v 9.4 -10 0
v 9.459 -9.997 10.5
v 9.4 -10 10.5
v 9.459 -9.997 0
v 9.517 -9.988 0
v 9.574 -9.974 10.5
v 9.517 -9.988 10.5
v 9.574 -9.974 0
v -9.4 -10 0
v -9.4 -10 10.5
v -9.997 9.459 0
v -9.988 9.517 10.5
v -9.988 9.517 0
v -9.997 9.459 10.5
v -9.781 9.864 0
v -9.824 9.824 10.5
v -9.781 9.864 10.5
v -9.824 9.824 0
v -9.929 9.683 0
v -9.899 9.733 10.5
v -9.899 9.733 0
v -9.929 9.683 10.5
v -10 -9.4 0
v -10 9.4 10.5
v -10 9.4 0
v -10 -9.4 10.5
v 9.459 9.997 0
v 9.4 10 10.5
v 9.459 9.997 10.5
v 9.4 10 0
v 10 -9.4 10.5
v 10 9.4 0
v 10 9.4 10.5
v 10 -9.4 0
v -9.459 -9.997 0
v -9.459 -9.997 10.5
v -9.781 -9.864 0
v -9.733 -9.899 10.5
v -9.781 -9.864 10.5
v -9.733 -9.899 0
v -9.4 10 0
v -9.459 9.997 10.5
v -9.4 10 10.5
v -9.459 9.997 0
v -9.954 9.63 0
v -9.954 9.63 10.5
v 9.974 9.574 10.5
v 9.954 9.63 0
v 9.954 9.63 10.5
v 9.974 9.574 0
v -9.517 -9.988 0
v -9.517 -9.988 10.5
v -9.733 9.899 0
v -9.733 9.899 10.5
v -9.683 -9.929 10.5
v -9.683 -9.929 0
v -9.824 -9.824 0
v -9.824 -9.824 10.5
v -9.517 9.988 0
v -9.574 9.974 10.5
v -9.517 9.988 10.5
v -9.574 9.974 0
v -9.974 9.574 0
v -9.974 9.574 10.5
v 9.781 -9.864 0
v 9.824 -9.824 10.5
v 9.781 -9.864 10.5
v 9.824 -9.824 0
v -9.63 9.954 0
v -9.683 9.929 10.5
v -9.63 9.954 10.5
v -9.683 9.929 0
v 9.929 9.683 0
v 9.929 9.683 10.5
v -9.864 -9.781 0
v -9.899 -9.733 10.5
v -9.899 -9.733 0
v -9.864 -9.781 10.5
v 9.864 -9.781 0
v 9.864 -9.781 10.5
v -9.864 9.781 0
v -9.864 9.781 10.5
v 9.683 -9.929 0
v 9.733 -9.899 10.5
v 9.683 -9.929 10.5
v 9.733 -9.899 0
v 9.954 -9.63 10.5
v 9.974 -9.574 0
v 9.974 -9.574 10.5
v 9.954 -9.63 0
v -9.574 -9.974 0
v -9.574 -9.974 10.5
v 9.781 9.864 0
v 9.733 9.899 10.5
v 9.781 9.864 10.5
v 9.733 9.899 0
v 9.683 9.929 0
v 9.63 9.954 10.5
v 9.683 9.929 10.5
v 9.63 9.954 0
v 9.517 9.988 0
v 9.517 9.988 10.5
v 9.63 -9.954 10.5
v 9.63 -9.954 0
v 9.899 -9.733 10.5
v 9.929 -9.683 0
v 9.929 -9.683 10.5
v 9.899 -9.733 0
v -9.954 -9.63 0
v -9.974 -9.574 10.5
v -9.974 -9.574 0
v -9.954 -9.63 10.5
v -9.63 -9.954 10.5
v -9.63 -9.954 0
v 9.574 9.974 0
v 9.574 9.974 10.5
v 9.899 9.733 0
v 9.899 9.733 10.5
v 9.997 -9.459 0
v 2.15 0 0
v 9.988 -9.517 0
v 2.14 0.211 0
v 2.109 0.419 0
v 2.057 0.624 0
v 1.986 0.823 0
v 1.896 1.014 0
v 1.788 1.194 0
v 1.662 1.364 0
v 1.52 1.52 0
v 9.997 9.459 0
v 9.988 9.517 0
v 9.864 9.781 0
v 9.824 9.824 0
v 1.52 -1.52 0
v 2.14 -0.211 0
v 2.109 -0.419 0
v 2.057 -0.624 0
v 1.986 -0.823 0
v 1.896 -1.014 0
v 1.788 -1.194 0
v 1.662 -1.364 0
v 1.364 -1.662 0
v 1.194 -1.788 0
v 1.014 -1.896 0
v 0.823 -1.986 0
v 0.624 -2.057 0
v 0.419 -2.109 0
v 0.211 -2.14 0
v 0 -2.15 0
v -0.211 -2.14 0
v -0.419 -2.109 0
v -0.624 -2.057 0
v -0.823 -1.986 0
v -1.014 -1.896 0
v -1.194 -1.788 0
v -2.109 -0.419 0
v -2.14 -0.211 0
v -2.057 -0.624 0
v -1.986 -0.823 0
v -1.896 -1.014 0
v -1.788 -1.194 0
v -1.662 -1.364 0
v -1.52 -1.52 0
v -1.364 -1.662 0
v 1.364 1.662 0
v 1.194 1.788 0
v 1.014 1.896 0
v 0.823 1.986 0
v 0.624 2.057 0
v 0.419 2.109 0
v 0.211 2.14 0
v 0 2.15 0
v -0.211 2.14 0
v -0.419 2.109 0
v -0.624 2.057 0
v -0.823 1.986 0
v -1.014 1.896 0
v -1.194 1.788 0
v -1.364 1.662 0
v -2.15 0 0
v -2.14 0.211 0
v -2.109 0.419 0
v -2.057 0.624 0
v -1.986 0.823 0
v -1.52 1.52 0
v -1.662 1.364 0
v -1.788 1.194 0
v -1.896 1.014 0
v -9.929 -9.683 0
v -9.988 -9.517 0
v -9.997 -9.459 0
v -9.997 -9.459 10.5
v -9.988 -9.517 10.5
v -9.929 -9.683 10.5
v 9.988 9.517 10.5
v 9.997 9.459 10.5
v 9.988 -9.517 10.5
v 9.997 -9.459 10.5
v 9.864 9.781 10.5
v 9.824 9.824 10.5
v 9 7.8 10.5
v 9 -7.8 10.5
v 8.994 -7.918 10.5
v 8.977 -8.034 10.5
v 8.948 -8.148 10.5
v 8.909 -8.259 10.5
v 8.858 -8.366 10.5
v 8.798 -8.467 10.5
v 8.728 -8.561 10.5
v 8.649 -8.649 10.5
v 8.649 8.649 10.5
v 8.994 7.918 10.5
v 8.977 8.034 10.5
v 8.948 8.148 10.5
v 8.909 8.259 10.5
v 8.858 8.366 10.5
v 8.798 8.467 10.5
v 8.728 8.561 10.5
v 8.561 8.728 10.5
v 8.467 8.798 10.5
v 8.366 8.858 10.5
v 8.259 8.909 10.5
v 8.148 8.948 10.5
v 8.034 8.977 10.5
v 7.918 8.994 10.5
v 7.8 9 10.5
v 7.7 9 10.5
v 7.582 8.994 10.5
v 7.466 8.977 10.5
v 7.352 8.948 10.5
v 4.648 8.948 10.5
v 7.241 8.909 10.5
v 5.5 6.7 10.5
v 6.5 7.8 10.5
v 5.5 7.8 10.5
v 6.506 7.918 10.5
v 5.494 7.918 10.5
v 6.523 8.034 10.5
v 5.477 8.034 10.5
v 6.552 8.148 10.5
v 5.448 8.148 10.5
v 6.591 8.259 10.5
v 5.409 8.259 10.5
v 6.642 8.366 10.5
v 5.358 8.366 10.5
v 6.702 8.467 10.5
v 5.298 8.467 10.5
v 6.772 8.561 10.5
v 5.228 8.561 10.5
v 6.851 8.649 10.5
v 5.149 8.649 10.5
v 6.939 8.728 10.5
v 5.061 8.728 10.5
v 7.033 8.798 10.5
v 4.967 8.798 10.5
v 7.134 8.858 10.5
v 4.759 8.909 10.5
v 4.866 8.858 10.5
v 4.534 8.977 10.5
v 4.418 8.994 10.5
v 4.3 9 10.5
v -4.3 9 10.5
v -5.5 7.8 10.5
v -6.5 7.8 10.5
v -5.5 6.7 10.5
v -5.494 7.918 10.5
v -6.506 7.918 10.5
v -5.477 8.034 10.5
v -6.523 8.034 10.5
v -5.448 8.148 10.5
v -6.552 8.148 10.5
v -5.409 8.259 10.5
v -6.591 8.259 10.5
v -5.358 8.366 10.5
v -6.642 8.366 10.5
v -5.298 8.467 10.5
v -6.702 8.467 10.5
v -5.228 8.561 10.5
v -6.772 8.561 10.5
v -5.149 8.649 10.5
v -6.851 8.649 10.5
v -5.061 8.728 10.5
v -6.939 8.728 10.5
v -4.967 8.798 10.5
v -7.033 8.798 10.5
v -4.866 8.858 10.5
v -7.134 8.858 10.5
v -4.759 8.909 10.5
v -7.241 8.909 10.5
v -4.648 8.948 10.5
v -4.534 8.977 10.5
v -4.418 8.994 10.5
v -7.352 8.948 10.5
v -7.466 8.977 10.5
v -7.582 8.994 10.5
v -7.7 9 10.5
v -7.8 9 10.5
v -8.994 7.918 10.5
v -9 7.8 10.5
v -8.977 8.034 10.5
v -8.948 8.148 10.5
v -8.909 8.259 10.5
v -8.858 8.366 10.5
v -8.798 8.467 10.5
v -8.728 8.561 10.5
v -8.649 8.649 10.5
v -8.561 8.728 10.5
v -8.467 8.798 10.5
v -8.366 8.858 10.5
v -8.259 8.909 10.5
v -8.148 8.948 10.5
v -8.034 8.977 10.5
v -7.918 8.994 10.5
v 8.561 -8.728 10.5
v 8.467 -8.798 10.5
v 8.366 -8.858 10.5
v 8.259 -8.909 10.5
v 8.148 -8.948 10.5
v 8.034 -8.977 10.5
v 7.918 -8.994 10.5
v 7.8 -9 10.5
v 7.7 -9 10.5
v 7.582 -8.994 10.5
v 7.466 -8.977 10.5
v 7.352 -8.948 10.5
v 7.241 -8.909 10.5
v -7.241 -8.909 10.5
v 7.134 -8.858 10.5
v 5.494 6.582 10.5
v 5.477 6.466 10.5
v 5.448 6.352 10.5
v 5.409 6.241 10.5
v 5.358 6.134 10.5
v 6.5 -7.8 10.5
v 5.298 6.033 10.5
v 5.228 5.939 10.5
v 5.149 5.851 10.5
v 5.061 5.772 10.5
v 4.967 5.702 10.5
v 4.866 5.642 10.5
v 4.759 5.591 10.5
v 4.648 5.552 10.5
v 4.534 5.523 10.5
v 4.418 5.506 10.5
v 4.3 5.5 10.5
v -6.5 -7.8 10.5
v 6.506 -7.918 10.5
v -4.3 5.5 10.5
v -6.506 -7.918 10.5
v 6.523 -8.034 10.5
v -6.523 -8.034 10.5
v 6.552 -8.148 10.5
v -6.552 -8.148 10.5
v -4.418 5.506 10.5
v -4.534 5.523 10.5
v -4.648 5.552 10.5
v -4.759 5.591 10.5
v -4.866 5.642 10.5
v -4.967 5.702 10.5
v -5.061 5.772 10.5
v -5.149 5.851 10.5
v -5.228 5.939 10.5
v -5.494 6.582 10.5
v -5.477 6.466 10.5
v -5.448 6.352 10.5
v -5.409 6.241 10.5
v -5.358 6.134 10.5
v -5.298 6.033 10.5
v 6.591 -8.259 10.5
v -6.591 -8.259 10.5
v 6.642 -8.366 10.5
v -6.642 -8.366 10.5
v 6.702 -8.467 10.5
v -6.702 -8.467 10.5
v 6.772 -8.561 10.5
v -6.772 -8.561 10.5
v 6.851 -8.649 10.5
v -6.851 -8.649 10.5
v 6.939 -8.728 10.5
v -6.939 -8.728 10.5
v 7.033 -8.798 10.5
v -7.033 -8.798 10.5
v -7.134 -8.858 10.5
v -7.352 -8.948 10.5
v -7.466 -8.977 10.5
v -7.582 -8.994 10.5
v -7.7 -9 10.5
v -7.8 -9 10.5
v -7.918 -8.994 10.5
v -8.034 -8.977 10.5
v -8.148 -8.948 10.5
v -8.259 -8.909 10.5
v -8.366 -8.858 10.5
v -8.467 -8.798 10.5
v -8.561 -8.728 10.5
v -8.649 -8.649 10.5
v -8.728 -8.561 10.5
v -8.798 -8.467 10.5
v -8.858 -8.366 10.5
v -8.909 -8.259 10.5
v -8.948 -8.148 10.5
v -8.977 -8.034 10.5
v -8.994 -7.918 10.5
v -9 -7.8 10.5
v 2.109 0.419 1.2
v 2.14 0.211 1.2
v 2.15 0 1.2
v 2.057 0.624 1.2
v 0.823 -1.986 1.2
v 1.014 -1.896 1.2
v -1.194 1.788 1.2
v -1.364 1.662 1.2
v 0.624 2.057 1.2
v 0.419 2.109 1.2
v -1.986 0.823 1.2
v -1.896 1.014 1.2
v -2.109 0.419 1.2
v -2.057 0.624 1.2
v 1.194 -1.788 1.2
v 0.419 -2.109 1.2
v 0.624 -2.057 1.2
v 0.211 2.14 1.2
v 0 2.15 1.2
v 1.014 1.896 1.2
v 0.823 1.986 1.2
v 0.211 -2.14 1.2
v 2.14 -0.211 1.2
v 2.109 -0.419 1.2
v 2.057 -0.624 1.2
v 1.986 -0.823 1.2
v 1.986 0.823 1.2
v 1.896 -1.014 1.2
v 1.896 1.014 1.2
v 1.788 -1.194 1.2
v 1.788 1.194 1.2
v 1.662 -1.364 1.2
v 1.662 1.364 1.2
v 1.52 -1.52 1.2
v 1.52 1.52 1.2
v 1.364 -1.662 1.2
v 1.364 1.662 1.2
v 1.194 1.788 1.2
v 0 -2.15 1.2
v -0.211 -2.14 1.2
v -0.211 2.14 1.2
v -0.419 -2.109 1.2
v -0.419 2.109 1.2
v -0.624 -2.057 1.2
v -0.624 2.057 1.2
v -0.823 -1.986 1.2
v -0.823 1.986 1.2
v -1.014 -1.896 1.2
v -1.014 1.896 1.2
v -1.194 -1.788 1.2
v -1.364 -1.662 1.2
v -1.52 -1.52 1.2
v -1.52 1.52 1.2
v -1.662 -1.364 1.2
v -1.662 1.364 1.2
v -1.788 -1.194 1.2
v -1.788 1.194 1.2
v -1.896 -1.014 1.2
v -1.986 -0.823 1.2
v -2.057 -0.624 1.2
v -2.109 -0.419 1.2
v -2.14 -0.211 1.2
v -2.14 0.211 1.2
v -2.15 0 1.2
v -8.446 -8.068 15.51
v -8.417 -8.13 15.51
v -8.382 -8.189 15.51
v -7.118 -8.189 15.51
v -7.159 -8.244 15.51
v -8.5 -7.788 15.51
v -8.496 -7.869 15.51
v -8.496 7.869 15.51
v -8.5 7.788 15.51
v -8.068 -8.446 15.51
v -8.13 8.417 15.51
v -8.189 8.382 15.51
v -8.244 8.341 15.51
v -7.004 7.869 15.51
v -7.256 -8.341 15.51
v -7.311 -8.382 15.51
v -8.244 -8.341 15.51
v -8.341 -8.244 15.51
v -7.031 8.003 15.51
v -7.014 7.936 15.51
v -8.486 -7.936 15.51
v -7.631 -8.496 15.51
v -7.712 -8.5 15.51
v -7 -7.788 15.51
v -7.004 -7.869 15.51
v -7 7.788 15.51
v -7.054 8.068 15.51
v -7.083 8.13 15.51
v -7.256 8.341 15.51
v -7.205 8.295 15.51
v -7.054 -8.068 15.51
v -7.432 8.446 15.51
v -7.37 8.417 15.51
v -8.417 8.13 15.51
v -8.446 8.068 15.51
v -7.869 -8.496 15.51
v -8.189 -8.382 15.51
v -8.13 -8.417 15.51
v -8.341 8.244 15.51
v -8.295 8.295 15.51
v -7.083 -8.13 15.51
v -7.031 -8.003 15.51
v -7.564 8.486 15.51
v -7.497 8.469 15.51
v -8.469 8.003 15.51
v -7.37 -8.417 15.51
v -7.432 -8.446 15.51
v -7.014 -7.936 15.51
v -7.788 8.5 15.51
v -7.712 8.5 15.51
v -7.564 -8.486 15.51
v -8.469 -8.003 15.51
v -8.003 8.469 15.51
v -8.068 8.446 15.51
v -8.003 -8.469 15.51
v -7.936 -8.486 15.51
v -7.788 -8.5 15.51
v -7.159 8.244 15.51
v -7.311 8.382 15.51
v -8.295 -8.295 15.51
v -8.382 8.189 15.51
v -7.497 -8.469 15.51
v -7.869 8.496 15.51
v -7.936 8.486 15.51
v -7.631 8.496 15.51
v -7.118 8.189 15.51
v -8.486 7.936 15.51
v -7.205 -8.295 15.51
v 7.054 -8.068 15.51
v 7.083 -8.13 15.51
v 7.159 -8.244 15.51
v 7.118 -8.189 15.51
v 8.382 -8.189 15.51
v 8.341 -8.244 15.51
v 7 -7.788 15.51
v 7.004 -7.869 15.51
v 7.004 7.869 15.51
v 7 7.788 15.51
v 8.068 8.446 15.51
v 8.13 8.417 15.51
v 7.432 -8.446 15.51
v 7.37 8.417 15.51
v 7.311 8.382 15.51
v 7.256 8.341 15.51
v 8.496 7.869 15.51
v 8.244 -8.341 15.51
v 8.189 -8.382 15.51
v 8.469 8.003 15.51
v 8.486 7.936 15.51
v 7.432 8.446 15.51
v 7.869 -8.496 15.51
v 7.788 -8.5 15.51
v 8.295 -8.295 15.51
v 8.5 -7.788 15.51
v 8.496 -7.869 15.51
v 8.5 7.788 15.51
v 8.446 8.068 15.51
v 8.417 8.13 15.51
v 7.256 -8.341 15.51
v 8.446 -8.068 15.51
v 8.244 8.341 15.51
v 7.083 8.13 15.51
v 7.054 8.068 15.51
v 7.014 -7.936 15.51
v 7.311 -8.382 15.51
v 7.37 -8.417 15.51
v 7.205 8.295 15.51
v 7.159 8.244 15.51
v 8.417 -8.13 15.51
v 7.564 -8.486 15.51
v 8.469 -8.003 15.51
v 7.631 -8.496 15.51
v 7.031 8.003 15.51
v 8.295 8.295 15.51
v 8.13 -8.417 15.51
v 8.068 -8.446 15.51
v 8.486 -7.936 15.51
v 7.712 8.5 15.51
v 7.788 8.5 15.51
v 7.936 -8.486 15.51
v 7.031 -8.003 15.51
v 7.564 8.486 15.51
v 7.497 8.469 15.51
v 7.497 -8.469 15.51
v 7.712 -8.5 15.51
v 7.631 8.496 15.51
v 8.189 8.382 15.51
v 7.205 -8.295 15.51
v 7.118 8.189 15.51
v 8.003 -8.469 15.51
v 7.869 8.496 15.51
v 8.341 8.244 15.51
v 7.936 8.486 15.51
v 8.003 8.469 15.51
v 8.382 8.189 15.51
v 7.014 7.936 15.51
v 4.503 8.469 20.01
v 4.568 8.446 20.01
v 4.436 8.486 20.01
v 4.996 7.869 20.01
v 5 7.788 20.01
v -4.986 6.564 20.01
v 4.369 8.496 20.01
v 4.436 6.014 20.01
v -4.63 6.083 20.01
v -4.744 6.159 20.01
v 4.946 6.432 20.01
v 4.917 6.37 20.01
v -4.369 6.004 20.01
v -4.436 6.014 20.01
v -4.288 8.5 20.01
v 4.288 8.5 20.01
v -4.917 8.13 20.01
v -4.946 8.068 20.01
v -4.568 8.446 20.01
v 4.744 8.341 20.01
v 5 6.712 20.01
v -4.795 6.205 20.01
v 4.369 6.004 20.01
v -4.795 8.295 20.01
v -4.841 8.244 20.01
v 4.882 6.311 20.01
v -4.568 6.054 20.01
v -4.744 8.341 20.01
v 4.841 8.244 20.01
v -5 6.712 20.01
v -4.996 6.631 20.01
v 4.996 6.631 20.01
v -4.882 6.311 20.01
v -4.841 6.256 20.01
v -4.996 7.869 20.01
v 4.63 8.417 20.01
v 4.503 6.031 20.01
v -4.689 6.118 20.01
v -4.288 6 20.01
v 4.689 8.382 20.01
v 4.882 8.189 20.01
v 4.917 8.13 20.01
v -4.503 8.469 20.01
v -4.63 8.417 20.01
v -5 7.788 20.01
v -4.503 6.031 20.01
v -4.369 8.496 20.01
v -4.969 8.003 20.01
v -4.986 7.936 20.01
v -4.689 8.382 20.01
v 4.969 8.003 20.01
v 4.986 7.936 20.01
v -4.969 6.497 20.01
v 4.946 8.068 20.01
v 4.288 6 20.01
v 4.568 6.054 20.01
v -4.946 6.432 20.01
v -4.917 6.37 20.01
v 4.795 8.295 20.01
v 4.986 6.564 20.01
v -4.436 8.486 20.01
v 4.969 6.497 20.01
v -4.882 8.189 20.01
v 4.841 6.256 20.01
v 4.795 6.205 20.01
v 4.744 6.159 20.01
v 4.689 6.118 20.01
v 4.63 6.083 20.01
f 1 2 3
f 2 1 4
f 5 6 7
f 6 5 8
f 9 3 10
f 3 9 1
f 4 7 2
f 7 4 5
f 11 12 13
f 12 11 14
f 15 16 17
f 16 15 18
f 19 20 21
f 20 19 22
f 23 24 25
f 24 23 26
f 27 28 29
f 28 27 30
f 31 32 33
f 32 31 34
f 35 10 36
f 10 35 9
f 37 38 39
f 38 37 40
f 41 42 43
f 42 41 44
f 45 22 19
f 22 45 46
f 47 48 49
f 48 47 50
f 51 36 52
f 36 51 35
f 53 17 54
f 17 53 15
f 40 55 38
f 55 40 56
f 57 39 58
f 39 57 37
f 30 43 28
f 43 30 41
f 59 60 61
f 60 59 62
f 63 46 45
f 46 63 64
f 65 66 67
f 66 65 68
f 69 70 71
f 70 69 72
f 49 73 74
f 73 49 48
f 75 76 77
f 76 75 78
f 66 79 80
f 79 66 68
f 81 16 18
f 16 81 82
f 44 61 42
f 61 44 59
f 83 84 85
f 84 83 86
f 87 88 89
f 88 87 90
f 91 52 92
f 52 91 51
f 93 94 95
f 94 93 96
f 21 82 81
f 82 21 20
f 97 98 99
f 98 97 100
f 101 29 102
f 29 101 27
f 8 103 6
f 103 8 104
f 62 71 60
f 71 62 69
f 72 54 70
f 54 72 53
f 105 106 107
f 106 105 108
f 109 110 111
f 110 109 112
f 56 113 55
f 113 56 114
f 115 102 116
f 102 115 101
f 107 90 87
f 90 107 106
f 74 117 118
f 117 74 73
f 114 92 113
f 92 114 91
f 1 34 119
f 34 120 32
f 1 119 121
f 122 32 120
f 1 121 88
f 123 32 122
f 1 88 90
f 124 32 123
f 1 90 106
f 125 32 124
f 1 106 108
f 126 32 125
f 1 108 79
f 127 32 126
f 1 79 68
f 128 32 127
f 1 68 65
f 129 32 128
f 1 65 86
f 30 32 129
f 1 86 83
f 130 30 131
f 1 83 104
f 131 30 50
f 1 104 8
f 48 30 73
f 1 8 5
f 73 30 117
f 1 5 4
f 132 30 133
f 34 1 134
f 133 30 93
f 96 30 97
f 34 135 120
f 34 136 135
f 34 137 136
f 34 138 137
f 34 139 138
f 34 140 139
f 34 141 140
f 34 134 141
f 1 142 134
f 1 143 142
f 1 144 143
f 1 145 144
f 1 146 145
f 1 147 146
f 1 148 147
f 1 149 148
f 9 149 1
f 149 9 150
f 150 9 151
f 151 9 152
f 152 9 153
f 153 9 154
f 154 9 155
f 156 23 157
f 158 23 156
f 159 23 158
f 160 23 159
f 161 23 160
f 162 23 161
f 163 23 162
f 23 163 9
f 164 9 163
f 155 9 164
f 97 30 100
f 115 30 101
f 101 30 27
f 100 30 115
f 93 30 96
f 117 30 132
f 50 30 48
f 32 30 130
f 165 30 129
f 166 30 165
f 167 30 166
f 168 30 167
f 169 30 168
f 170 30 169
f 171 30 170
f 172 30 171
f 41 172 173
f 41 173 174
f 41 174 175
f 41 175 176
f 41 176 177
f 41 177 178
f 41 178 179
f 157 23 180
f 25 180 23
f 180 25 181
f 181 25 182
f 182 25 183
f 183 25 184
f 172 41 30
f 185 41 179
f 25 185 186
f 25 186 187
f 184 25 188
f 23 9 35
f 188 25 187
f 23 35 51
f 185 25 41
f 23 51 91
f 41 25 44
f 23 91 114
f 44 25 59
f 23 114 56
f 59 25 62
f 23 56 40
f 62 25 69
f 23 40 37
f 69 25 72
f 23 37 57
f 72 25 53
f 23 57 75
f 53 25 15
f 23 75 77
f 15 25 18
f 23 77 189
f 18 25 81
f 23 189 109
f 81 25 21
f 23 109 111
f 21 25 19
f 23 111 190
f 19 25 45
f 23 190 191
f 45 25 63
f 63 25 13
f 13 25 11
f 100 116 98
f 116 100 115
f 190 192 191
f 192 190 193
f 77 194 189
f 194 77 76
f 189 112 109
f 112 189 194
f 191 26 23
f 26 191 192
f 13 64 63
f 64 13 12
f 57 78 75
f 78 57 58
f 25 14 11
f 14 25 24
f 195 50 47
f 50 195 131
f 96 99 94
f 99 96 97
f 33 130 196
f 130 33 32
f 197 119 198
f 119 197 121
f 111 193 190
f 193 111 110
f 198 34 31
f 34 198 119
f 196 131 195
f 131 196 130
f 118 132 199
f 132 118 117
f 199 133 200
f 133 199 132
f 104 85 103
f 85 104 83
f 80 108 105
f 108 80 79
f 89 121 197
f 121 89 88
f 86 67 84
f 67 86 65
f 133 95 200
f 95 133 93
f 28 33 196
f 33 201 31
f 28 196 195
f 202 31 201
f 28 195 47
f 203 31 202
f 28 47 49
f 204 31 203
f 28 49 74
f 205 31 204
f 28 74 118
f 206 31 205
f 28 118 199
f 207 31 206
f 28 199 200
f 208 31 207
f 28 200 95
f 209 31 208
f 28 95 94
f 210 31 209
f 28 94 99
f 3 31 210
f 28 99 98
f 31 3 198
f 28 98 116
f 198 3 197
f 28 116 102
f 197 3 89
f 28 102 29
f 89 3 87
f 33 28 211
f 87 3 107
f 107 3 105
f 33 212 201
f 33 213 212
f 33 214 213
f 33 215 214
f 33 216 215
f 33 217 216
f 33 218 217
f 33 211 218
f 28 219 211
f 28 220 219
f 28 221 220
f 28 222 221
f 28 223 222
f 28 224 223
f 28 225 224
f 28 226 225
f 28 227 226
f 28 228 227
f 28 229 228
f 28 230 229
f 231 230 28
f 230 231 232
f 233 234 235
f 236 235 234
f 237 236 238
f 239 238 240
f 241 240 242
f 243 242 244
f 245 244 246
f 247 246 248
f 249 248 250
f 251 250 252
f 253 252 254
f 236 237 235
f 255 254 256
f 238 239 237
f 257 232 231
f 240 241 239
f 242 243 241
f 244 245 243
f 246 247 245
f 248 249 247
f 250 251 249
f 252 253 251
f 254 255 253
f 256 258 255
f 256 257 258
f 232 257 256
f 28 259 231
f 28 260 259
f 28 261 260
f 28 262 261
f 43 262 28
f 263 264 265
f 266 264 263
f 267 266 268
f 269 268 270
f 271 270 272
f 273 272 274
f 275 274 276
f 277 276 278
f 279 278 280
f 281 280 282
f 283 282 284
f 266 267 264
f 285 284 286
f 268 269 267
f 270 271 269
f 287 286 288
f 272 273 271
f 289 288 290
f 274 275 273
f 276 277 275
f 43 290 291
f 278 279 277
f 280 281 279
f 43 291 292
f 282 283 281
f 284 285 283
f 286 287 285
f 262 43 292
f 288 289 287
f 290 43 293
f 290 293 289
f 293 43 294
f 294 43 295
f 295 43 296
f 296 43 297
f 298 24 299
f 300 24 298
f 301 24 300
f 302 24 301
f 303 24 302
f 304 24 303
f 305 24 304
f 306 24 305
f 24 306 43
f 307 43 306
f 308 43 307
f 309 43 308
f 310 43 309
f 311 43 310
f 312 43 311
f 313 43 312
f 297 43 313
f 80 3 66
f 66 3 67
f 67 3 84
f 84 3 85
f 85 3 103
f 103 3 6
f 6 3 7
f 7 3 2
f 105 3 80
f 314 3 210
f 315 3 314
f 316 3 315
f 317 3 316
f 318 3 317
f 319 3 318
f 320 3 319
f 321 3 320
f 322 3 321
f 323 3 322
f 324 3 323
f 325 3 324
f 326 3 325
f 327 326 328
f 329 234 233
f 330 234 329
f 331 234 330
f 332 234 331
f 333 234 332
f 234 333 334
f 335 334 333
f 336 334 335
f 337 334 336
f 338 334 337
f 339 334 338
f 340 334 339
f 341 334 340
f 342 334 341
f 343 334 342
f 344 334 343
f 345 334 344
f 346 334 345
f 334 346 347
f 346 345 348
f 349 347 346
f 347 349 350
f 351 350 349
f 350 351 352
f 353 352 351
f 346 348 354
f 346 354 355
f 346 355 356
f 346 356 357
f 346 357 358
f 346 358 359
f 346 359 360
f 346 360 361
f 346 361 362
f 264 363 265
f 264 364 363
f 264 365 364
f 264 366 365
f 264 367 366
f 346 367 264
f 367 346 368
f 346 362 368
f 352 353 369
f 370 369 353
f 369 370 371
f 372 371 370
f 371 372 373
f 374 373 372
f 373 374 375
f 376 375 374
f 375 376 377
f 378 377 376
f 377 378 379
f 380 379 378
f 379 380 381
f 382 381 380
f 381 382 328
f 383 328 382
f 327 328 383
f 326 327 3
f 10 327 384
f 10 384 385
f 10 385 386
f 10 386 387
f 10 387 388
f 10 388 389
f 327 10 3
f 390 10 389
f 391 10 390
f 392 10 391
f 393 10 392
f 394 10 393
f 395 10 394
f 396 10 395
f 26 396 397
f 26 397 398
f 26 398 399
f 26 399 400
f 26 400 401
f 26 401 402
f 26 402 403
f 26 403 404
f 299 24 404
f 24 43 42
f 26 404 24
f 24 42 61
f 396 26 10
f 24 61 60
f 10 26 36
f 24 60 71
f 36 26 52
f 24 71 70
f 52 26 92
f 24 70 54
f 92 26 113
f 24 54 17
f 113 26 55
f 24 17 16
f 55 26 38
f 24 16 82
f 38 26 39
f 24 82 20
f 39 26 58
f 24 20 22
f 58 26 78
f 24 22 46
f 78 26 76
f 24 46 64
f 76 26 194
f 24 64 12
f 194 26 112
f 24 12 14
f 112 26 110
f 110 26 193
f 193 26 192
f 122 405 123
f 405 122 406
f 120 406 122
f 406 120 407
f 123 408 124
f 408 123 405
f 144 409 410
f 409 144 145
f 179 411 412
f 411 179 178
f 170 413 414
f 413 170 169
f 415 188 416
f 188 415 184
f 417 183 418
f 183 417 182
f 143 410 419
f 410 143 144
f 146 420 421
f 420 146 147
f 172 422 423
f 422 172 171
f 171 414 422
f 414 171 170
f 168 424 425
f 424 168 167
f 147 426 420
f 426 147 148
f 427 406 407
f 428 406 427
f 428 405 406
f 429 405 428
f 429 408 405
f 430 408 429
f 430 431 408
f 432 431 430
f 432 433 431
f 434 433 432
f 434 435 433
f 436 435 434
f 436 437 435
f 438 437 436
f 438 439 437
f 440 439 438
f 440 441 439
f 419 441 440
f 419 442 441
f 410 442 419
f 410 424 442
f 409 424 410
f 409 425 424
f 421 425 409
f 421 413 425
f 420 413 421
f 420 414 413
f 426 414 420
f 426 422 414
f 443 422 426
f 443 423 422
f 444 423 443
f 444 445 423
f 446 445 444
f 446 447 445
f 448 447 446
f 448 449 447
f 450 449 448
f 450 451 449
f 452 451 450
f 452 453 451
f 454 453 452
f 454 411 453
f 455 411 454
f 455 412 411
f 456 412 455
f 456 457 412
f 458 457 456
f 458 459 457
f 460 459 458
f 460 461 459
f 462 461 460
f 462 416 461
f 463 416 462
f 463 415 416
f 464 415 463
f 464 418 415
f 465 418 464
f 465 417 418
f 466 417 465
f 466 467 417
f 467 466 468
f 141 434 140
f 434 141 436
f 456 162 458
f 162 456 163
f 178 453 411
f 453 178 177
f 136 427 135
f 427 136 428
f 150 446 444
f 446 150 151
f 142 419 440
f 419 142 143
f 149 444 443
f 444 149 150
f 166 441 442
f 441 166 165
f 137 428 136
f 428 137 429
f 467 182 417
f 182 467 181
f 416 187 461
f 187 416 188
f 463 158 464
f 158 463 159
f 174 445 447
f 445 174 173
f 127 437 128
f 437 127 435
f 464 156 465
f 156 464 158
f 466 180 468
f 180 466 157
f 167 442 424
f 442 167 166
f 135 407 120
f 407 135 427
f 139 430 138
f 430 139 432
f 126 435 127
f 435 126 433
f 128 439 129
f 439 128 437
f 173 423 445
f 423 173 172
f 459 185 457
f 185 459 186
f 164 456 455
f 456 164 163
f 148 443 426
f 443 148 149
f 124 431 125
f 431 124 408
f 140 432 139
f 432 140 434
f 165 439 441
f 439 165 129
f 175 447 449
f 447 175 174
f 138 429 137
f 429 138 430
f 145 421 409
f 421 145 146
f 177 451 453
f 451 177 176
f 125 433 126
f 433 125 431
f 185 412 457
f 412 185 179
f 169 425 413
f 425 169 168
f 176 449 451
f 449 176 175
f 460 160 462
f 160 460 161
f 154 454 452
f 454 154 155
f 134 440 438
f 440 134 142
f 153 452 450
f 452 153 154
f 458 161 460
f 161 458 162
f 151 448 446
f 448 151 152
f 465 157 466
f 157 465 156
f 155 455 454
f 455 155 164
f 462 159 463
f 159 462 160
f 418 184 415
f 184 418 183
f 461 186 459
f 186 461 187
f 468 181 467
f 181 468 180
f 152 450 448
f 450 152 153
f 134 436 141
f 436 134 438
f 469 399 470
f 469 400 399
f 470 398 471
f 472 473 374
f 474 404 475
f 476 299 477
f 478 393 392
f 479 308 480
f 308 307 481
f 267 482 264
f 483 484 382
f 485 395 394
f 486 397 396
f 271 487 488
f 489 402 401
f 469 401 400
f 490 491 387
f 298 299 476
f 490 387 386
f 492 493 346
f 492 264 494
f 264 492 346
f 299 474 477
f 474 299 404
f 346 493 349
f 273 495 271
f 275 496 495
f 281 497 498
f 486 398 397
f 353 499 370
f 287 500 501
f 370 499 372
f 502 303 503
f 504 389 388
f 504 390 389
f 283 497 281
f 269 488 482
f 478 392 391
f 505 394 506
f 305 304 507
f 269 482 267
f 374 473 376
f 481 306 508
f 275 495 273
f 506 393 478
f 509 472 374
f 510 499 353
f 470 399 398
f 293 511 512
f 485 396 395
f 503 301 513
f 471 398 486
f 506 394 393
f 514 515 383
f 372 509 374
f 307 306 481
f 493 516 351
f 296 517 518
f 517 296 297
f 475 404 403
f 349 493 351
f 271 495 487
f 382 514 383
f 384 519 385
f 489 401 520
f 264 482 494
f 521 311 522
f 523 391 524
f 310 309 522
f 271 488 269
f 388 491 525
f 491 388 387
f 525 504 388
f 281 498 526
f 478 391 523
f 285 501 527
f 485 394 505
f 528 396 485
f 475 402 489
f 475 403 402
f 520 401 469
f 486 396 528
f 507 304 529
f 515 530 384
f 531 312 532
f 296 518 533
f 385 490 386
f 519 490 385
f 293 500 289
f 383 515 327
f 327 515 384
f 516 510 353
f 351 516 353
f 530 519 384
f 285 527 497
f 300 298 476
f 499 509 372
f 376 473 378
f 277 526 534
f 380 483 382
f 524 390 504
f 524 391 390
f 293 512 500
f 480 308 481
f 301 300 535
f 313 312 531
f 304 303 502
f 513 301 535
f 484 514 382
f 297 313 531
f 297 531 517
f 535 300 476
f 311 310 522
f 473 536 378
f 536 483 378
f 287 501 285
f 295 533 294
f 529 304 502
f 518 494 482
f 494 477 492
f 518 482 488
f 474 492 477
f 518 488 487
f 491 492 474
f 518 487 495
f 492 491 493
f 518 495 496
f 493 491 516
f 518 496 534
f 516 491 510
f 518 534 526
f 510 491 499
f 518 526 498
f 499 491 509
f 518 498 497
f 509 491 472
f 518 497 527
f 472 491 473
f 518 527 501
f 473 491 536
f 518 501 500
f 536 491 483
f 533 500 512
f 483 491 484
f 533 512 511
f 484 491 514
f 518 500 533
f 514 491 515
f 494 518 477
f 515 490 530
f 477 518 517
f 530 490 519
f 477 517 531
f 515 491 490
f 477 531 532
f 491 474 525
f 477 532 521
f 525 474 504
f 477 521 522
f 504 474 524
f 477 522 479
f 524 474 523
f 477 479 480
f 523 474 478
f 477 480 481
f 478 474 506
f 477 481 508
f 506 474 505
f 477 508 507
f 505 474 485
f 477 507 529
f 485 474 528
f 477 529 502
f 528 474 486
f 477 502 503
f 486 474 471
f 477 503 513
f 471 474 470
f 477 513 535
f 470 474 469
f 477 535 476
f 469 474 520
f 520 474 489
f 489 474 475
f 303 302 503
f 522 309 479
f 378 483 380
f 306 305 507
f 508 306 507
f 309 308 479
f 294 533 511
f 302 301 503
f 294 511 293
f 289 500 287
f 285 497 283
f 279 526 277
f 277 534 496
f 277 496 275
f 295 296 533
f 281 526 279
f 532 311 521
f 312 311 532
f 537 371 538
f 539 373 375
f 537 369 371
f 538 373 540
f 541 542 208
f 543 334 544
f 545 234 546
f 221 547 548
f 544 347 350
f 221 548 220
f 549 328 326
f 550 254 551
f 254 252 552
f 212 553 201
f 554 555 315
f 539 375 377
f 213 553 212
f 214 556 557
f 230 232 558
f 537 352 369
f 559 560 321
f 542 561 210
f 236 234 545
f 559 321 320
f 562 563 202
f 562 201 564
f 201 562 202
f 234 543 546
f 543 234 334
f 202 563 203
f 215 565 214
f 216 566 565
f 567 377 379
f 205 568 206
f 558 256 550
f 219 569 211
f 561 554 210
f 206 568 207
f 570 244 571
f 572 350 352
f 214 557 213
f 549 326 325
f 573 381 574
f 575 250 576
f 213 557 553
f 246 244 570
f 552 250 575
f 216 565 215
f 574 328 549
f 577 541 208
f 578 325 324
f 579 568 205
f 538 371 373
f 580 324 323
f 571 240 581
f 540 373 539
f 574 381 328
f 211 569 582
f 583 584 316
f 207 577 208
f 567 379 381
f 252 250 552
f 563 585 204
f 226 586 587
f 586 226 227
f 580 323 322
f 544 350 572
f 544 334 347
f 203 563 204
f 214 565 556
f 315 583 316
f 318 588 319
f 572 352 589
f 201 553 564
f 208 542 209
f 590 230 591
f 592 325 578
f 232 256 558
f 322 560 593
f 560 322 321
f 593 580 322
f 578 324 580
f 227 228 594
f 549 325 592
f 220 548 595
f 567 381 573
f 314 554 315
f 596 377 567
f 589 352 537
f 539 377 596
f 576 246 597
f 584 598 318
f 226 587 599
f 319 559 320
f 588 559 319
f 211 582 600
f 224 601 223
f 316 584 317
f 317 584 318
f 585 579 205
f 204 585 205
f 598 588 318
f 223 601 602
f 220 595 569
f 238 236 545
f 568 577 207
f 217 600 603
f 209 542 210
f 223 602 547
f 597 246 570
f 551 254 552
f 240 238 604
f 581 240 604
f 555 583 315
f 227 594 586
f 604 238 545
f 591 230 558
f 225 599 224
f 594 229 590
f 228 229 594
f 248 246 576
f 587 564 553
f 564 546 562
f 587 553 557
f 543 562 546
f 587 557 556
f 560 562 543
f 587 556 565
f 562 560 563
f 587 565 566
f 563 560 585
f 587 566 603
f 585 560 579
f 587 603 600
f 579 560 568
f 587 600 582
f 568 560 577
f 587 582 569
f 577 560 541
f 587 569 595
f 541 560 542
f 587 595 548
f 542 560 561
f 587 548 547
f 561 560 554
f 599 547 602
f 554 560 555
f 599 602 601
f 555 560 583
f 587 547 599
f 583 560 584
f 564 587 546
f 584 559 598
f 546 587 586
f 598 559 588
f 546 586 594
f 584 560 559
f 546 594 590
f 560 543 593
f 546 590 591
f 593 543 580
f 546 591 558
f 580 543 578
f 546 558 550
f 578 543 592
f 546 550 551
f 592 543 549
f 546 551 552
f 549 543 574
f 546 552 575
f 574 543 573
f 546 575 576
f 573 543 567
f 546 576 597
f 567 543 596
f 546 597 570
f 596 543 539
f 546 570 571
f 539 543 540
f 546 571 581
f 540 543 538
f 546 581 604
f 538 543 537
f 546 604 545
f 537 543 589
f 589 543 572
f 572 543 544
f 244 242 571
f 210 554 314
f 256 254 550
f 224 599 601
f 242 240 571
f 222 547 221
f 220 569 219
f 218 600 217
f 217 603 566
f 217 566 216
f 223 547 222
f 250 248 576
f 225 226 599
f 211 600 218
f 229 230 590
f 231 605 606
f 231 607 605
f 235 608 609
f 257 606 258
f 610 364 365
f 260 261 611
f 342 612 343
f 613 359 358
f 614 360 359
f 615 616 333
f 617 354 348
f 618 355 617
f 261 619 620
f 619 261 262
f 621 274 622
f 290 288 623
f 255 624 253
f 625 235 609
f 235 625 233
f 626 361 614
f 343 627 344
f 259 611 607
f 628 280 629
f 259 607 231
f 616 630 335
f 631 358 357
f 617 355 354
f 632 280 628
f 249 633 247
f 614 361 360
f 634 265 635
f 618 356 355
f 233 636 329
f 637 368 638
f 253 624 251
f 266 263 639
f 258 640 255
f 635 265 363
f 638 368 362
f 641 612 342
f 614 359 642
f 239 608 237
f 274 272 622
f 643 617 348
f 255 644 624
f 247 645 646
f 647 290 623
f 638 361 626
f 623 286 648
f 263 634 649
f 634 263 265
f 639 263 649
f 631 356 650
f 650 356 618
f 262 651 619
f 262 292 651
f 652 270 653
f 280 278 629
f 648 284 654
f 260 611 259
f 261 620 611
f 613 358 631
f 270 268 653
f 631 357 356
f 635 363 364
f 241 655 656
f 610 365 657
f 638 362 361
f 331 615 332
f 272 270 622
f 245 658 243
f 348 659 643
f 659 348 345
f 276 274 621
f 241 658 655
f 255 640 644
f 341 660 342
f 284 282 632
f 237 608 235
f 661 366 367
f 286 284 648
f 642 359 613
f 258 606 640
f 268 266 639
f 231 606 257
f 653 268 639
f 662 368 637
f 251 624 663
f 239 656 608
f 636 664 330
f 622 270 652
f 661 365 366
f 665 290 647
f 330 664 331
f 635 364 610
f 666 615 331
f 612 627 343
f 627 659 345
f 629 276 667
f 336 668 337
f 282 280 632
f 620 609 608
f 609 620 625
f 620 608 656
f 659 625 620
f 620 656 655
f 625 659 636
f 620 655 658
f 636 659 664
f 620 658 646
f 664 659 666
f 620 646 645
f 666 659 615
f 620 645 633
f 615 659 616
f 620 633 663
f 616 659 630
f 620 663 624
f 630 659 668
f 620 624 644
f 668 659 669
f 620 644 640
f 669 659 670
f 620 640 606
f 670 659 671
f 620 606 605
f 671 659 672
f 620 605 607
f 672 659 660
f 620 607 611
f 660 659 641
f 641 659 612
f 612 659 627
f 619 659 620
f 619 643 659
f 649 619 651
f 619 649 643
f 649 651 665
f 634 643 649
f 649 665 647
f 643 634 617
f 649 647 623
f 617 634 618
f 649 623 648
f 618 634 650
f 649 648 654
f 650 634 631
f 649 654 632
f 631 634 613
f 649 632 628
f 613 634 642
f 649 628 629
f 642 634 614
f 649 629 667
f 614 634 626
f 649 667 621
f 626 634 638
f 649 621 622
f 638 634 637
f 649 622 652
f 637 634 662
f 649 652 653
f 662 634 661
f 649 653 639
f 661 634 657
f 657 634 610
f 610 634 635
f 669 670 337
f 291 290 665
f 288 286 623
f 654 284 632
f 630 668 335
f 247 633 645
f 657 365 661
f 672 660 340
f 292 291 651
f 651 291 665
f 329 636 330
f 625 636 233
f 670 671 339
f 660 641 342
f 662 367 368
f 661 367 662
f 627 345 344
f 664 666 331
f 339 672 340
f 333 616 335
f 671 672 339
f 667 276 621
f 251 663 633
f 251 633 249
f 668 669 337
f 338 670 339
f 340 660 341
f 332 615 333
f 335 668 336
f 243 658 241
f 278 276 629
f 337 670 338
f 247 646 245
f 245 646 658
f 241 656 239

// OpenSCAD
// livingroom / armchair — a one-seat token: a raised back cushion along the rear
// edge and an arm cushion down each side, the single-seat sibling of the sofa.
//
// Width/Depth are the real-world footprint in cm: a compact one-seat armchair,
// close enough to square that the back and arm cushions below are what tell the
// front from the back on the plan, not the outline. The heights are real cm too:
// Height is the top of the back — how tall the chair is — Arm the top of the arms
// and Seat the seat they rise from. The block is the seat; the cushions stand the
// rest on top of it (see printed_h() / rise() in lib/common.scad).

include <../lib/common.scad>

Width  = 80;  // cm
Depth  = 80;  // cm
Height = 80;  // cm — top of the back cushion
Arm    = 62;  // cm — top of the arms
Seat   = 42;  // cm — seat height

// printed mm: the seat block the cushions stand on, and how far (cm) the back and
// the arms rise off it to reach Height / Arm
Seat_z = printed_h(Seat);
Pad_h  = Height - Seat;
Arm_h  = Arm - Seat;

Show_cushions = true;
// Back and arm cushions, in real-world cm — a backrest along the rear edge (+Y)
// and an arm rail down each side, narrowed to whatever the seat leaves between
// them (as bed.scad narrows its pillows with Pillow_gap).
Back_d      = 14;  // back cushion depth (front-to-back)
Arm_w       = 10;  // arm cushion width (side-to-side)
Cushion_gap = 4;    // seat left around and between the cushions
// One central magnet pocket in the bottom face: the seat is small and near-square
// (80 cm is 20 mm at 1:40), so a single pocket already stops it pivoting; see
// Magnet_* in lib/common.scad.
Magnets = 1;

armchair();

module armchair() {
    // the back cushion sits between the two arms, with a gap to each
    back_w = Width - 2 * Arm_w - 4 * Cushion_gap;
    back_y = Depth / 2 - Cushion_gap - Back_d / 2;
    // the arms run the depth of the seat, inset from the front and back edges
    arm_d  = Depth - 2 * Cushion_gap;
    arm_x  = Width / 2 - Cushion_gap - Arm_w / 2;
    union() {
        difference() {
            footprint(Width, Depth, Seat_z);
            if (Magnets > 0)
                magnets(Width, Depth, Magnets);
        }
        if (Show_cushions) {
            // back cushion along the rear edge
            translate([0, cm(back_y), 0])
                cushion(back_w, Back_d, Seat_z, Pad_h);
            // an arm cushion down each side
            for (s = [-1, 1])
                translate([cm(s * arm_x), 0, 0])
                    cushion(Arm_w, arm_d, Seat_z, Arm_h);
        }
    }
}
